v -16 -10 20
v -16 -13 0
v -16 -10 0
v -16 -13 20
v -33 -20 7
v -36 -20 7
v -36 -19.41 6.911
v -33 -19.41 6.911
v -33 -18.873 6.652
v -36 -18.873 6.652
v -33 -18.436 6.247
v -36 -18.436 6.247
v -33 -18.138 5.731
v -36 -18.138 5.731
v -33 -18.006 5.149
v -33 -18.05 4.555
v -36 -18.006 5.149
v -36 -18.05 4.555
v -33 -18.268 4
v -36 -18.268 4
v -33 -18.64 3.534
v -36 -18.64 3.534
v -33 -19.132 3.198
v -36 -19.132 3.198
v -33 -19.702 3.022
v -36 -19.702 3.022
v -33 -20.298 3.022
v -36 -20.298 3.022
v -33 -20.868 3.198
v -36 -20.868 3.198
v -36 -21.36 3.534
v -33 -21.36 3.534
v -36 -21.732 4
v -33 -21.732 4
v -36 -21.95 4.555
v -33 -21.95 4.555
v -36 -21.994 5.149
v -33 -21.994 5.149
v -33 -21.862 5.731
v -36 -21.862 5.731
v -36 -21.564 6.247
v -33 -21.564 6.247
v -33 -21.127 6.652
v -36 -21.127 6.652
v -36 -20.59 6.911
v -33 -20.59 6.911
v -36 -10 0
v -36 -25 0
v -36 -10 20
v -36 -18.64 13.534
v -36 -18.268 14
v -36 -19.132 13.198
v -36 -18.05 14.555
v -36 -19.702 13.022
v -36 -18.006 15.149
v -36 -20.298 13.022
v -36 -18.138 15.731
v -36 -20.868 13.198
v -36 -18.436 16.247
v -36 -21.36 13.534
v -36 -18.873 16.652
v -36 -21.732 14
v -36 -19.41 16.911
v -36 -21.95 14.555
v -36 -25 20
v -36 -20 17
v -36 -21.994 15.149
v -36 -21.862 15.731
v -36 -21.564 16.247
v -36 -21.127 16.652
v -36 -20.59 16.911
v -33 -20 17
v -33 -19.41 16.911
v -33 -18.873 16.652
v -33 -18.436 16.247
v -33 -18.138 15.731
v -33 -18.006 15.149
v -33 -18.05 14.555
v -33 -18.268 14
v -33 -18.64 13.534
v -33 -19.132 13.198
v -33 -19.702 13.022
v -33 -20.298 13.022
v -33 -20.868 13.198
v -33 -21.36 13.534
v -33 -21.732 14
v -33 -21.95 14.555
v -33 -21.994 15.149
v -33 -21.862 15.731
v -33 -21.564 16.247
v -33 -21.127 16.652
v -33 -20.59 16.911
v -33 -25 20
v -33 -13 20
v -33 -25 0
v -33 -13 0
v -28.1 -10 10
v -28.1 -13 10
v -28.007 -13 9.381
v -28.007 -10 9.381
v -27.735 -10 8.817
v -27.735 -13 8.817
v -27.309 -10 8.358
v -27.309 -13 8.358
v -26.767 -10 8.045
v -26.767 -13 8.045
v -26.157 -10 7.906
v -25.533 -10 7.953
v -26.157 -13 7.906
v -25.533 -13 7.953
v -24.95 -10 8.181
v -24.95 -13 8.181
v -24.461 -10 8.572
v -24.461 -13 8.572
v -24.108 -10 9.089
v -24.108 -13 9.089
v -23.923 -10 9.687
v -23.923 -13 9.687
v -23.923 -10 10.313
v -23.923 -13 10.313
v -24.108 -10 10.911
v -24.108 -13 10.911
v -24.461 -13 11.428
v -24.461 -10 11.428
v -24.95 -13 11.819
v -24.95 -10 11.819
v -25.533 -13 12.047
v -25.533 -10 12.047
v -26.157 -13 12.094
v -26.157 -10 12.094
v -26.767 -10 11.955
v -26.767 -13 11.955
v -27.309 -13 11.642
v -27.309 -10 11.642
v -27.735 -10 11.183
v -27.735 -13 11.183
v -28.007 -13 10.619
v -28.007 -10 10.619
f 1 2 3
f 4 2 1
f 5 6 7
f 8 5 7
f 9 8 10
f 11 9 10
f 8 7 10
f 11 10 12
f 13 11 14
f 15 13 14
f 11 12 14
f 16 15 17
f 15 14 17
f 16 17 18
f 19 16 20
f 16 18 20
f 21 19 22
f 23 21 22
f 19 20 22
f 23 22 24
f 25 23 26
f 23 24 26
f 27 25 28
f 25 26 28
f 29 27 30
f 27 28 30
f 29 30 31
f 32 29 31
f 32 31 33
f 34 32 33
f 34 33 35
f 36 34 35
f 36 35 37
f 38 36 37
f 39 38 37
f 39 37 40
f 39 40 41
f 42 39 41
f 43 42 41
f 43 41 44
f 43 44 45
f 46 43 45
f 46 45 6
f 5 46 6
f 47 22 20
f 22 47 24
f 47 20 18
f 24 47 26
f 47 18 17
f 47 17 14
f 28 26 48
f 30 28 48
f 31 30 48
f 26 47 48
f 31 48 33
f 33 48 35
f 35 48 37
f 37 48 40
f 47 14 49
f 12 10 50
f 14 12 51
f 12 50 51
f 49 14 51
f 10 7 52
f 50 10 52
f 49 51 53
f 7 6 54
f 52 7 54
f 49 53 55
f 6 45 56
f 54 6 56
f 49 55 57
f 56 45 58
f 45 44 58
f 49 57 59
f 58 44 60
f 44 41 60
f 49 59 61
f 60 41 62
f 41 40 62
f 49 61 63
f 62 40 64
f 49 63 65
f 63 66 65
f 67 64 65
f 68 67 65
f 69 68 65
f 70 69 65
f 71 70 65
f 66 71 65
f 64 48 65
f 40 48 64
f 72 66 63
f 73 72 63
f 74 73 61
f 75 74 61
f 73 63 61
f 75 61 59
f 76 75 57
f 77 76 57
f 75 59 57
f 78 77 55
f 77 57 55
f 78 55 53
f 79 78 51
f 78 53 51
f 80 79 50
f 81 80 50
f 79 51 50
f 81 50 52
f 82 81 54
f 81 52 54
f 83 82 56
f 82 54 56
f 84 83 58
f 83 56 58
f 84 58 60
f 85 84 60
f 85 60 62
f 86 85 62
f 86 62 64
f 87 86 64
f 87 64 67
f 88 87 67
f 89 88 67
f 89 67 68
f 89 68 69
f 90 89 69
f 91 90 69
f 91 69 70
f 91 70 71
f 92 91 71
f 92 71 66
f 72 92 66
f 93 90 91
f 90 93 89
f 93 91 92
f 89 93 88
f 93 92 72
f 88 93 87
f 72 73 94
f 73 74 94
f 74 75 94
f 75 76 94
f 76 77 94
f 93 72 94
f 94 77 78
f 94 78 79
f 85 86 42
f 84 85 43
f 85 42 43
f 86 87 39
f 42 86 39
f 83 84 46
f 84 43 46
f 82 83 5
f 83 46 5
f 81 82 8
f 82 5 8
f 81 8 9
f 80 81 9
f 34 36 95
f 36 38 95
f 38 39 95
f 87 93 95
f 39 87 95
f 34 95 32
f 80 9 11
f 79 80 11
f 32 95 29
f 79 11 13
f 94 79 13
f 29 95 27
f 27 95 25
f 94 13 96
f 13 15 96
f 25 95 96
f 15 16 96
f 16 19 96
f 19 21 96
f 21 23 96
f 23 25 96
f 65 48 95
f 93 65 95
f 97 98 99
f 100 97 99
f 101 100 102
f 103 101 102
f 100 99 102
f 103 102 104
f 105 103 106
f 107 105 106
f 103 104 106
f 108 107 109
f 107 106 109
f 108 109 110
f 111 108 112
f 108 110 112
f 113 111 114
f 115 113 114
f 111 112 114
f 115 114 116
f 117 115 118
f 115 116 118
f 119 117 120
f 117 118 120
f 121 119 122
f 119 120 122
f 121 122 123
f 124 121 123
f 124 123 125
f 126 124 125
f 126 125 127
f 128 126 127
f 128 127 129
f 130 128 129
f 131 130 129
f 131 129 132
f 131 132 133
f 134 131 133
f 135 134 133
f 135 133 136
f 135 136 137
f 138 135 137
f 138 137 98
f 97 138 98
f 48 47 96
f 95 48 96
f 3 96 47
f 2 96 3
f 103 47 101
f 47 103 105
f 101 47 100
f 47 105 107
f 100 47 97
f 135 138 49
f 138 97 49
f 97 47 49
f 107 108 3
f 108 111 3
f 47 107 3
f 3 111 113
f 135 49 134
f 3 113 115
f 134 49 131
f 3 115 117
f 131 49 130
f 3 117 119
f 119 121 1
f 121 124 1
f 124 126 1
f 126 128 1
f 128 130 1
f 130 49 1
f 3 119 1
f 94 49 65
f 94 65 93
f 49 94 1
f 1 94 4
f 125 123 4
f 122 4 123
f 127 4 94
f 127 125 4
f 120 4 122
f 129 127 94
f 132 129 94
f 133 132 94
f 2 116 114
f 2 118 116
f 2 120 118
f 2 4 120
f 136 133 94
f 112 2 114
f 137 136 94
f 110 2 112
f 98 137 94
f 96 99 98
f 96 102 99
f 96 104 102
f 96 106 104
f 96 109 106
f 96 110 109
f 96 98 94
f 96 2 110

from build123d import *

# Parameters (mm, degrees)
SKETCH_1_W                  = 20
SKETCH_1_H                  = 20
EXTRUDE_1_DEPTH             = 15
SKETCH_2_W                  = 17
SKETCH_2_H                  = 12
CUT_EXTRUDE_1_DEPTH         = 49.176757882
HOLE_WIZARD_4_2_4_2_1_D     = 4.2
HOLE_WIZARD_4_2_4_2_1_DEPTH = 15
HOLE_WIZARD_4_0_4_1_D       = 4


with BuildPart() as part:
    # 草图1 → 凸台-拉伸1 (new body)
    with BuildSketch(Plane.XZ.offset(25)):
        with Locations((-26, 10)):
            Rectangle(SKETCH_1_W, SKETCH_1_H)
    extrude(amount=-EXTRUDE_1_DEPTH)

    # 草图2 → 切除-拉伸1 (cut, through all)
    with BuildSketch(Plane(origin=(0, 0, 0), x_dir=(-1, 0, 0), z_dir=(0, 0, -1))):
        with Locations((24.5, -19)):
            Rectangle(SKETCH_2_W, SKETCH_2_H)
    extrude(amount=-CUT_EXTRUDE_1_DEPTH, mode=Mode.SUBTRACT)

    # Ø4.2 (4.2) 直径孔1
    with Locations(Plane(origin=(0, -10, 0), x_dir=(1, 0, 0), z_dir=(0, 1, 0))):
        with Locations((-26, -10)):
            Hole(HOLE_WIZARD_4_2_4_2_1_D / 2, depth=HOLE_WIZARD_4_2_4_2_1_DEPTH)

    # Ø4.0 (4) 直径孔1 (through all)
    with Locations(Plane(origin=(-33, 0, 0), x_dir=(0, 0, -1), z_dir=(1, 0, 0))):
        with Locations((-15, -20), (-5, -20)):
            Hole(HOLE_WIZARD_4_0_4_1_D / 2)


solid = part.part
